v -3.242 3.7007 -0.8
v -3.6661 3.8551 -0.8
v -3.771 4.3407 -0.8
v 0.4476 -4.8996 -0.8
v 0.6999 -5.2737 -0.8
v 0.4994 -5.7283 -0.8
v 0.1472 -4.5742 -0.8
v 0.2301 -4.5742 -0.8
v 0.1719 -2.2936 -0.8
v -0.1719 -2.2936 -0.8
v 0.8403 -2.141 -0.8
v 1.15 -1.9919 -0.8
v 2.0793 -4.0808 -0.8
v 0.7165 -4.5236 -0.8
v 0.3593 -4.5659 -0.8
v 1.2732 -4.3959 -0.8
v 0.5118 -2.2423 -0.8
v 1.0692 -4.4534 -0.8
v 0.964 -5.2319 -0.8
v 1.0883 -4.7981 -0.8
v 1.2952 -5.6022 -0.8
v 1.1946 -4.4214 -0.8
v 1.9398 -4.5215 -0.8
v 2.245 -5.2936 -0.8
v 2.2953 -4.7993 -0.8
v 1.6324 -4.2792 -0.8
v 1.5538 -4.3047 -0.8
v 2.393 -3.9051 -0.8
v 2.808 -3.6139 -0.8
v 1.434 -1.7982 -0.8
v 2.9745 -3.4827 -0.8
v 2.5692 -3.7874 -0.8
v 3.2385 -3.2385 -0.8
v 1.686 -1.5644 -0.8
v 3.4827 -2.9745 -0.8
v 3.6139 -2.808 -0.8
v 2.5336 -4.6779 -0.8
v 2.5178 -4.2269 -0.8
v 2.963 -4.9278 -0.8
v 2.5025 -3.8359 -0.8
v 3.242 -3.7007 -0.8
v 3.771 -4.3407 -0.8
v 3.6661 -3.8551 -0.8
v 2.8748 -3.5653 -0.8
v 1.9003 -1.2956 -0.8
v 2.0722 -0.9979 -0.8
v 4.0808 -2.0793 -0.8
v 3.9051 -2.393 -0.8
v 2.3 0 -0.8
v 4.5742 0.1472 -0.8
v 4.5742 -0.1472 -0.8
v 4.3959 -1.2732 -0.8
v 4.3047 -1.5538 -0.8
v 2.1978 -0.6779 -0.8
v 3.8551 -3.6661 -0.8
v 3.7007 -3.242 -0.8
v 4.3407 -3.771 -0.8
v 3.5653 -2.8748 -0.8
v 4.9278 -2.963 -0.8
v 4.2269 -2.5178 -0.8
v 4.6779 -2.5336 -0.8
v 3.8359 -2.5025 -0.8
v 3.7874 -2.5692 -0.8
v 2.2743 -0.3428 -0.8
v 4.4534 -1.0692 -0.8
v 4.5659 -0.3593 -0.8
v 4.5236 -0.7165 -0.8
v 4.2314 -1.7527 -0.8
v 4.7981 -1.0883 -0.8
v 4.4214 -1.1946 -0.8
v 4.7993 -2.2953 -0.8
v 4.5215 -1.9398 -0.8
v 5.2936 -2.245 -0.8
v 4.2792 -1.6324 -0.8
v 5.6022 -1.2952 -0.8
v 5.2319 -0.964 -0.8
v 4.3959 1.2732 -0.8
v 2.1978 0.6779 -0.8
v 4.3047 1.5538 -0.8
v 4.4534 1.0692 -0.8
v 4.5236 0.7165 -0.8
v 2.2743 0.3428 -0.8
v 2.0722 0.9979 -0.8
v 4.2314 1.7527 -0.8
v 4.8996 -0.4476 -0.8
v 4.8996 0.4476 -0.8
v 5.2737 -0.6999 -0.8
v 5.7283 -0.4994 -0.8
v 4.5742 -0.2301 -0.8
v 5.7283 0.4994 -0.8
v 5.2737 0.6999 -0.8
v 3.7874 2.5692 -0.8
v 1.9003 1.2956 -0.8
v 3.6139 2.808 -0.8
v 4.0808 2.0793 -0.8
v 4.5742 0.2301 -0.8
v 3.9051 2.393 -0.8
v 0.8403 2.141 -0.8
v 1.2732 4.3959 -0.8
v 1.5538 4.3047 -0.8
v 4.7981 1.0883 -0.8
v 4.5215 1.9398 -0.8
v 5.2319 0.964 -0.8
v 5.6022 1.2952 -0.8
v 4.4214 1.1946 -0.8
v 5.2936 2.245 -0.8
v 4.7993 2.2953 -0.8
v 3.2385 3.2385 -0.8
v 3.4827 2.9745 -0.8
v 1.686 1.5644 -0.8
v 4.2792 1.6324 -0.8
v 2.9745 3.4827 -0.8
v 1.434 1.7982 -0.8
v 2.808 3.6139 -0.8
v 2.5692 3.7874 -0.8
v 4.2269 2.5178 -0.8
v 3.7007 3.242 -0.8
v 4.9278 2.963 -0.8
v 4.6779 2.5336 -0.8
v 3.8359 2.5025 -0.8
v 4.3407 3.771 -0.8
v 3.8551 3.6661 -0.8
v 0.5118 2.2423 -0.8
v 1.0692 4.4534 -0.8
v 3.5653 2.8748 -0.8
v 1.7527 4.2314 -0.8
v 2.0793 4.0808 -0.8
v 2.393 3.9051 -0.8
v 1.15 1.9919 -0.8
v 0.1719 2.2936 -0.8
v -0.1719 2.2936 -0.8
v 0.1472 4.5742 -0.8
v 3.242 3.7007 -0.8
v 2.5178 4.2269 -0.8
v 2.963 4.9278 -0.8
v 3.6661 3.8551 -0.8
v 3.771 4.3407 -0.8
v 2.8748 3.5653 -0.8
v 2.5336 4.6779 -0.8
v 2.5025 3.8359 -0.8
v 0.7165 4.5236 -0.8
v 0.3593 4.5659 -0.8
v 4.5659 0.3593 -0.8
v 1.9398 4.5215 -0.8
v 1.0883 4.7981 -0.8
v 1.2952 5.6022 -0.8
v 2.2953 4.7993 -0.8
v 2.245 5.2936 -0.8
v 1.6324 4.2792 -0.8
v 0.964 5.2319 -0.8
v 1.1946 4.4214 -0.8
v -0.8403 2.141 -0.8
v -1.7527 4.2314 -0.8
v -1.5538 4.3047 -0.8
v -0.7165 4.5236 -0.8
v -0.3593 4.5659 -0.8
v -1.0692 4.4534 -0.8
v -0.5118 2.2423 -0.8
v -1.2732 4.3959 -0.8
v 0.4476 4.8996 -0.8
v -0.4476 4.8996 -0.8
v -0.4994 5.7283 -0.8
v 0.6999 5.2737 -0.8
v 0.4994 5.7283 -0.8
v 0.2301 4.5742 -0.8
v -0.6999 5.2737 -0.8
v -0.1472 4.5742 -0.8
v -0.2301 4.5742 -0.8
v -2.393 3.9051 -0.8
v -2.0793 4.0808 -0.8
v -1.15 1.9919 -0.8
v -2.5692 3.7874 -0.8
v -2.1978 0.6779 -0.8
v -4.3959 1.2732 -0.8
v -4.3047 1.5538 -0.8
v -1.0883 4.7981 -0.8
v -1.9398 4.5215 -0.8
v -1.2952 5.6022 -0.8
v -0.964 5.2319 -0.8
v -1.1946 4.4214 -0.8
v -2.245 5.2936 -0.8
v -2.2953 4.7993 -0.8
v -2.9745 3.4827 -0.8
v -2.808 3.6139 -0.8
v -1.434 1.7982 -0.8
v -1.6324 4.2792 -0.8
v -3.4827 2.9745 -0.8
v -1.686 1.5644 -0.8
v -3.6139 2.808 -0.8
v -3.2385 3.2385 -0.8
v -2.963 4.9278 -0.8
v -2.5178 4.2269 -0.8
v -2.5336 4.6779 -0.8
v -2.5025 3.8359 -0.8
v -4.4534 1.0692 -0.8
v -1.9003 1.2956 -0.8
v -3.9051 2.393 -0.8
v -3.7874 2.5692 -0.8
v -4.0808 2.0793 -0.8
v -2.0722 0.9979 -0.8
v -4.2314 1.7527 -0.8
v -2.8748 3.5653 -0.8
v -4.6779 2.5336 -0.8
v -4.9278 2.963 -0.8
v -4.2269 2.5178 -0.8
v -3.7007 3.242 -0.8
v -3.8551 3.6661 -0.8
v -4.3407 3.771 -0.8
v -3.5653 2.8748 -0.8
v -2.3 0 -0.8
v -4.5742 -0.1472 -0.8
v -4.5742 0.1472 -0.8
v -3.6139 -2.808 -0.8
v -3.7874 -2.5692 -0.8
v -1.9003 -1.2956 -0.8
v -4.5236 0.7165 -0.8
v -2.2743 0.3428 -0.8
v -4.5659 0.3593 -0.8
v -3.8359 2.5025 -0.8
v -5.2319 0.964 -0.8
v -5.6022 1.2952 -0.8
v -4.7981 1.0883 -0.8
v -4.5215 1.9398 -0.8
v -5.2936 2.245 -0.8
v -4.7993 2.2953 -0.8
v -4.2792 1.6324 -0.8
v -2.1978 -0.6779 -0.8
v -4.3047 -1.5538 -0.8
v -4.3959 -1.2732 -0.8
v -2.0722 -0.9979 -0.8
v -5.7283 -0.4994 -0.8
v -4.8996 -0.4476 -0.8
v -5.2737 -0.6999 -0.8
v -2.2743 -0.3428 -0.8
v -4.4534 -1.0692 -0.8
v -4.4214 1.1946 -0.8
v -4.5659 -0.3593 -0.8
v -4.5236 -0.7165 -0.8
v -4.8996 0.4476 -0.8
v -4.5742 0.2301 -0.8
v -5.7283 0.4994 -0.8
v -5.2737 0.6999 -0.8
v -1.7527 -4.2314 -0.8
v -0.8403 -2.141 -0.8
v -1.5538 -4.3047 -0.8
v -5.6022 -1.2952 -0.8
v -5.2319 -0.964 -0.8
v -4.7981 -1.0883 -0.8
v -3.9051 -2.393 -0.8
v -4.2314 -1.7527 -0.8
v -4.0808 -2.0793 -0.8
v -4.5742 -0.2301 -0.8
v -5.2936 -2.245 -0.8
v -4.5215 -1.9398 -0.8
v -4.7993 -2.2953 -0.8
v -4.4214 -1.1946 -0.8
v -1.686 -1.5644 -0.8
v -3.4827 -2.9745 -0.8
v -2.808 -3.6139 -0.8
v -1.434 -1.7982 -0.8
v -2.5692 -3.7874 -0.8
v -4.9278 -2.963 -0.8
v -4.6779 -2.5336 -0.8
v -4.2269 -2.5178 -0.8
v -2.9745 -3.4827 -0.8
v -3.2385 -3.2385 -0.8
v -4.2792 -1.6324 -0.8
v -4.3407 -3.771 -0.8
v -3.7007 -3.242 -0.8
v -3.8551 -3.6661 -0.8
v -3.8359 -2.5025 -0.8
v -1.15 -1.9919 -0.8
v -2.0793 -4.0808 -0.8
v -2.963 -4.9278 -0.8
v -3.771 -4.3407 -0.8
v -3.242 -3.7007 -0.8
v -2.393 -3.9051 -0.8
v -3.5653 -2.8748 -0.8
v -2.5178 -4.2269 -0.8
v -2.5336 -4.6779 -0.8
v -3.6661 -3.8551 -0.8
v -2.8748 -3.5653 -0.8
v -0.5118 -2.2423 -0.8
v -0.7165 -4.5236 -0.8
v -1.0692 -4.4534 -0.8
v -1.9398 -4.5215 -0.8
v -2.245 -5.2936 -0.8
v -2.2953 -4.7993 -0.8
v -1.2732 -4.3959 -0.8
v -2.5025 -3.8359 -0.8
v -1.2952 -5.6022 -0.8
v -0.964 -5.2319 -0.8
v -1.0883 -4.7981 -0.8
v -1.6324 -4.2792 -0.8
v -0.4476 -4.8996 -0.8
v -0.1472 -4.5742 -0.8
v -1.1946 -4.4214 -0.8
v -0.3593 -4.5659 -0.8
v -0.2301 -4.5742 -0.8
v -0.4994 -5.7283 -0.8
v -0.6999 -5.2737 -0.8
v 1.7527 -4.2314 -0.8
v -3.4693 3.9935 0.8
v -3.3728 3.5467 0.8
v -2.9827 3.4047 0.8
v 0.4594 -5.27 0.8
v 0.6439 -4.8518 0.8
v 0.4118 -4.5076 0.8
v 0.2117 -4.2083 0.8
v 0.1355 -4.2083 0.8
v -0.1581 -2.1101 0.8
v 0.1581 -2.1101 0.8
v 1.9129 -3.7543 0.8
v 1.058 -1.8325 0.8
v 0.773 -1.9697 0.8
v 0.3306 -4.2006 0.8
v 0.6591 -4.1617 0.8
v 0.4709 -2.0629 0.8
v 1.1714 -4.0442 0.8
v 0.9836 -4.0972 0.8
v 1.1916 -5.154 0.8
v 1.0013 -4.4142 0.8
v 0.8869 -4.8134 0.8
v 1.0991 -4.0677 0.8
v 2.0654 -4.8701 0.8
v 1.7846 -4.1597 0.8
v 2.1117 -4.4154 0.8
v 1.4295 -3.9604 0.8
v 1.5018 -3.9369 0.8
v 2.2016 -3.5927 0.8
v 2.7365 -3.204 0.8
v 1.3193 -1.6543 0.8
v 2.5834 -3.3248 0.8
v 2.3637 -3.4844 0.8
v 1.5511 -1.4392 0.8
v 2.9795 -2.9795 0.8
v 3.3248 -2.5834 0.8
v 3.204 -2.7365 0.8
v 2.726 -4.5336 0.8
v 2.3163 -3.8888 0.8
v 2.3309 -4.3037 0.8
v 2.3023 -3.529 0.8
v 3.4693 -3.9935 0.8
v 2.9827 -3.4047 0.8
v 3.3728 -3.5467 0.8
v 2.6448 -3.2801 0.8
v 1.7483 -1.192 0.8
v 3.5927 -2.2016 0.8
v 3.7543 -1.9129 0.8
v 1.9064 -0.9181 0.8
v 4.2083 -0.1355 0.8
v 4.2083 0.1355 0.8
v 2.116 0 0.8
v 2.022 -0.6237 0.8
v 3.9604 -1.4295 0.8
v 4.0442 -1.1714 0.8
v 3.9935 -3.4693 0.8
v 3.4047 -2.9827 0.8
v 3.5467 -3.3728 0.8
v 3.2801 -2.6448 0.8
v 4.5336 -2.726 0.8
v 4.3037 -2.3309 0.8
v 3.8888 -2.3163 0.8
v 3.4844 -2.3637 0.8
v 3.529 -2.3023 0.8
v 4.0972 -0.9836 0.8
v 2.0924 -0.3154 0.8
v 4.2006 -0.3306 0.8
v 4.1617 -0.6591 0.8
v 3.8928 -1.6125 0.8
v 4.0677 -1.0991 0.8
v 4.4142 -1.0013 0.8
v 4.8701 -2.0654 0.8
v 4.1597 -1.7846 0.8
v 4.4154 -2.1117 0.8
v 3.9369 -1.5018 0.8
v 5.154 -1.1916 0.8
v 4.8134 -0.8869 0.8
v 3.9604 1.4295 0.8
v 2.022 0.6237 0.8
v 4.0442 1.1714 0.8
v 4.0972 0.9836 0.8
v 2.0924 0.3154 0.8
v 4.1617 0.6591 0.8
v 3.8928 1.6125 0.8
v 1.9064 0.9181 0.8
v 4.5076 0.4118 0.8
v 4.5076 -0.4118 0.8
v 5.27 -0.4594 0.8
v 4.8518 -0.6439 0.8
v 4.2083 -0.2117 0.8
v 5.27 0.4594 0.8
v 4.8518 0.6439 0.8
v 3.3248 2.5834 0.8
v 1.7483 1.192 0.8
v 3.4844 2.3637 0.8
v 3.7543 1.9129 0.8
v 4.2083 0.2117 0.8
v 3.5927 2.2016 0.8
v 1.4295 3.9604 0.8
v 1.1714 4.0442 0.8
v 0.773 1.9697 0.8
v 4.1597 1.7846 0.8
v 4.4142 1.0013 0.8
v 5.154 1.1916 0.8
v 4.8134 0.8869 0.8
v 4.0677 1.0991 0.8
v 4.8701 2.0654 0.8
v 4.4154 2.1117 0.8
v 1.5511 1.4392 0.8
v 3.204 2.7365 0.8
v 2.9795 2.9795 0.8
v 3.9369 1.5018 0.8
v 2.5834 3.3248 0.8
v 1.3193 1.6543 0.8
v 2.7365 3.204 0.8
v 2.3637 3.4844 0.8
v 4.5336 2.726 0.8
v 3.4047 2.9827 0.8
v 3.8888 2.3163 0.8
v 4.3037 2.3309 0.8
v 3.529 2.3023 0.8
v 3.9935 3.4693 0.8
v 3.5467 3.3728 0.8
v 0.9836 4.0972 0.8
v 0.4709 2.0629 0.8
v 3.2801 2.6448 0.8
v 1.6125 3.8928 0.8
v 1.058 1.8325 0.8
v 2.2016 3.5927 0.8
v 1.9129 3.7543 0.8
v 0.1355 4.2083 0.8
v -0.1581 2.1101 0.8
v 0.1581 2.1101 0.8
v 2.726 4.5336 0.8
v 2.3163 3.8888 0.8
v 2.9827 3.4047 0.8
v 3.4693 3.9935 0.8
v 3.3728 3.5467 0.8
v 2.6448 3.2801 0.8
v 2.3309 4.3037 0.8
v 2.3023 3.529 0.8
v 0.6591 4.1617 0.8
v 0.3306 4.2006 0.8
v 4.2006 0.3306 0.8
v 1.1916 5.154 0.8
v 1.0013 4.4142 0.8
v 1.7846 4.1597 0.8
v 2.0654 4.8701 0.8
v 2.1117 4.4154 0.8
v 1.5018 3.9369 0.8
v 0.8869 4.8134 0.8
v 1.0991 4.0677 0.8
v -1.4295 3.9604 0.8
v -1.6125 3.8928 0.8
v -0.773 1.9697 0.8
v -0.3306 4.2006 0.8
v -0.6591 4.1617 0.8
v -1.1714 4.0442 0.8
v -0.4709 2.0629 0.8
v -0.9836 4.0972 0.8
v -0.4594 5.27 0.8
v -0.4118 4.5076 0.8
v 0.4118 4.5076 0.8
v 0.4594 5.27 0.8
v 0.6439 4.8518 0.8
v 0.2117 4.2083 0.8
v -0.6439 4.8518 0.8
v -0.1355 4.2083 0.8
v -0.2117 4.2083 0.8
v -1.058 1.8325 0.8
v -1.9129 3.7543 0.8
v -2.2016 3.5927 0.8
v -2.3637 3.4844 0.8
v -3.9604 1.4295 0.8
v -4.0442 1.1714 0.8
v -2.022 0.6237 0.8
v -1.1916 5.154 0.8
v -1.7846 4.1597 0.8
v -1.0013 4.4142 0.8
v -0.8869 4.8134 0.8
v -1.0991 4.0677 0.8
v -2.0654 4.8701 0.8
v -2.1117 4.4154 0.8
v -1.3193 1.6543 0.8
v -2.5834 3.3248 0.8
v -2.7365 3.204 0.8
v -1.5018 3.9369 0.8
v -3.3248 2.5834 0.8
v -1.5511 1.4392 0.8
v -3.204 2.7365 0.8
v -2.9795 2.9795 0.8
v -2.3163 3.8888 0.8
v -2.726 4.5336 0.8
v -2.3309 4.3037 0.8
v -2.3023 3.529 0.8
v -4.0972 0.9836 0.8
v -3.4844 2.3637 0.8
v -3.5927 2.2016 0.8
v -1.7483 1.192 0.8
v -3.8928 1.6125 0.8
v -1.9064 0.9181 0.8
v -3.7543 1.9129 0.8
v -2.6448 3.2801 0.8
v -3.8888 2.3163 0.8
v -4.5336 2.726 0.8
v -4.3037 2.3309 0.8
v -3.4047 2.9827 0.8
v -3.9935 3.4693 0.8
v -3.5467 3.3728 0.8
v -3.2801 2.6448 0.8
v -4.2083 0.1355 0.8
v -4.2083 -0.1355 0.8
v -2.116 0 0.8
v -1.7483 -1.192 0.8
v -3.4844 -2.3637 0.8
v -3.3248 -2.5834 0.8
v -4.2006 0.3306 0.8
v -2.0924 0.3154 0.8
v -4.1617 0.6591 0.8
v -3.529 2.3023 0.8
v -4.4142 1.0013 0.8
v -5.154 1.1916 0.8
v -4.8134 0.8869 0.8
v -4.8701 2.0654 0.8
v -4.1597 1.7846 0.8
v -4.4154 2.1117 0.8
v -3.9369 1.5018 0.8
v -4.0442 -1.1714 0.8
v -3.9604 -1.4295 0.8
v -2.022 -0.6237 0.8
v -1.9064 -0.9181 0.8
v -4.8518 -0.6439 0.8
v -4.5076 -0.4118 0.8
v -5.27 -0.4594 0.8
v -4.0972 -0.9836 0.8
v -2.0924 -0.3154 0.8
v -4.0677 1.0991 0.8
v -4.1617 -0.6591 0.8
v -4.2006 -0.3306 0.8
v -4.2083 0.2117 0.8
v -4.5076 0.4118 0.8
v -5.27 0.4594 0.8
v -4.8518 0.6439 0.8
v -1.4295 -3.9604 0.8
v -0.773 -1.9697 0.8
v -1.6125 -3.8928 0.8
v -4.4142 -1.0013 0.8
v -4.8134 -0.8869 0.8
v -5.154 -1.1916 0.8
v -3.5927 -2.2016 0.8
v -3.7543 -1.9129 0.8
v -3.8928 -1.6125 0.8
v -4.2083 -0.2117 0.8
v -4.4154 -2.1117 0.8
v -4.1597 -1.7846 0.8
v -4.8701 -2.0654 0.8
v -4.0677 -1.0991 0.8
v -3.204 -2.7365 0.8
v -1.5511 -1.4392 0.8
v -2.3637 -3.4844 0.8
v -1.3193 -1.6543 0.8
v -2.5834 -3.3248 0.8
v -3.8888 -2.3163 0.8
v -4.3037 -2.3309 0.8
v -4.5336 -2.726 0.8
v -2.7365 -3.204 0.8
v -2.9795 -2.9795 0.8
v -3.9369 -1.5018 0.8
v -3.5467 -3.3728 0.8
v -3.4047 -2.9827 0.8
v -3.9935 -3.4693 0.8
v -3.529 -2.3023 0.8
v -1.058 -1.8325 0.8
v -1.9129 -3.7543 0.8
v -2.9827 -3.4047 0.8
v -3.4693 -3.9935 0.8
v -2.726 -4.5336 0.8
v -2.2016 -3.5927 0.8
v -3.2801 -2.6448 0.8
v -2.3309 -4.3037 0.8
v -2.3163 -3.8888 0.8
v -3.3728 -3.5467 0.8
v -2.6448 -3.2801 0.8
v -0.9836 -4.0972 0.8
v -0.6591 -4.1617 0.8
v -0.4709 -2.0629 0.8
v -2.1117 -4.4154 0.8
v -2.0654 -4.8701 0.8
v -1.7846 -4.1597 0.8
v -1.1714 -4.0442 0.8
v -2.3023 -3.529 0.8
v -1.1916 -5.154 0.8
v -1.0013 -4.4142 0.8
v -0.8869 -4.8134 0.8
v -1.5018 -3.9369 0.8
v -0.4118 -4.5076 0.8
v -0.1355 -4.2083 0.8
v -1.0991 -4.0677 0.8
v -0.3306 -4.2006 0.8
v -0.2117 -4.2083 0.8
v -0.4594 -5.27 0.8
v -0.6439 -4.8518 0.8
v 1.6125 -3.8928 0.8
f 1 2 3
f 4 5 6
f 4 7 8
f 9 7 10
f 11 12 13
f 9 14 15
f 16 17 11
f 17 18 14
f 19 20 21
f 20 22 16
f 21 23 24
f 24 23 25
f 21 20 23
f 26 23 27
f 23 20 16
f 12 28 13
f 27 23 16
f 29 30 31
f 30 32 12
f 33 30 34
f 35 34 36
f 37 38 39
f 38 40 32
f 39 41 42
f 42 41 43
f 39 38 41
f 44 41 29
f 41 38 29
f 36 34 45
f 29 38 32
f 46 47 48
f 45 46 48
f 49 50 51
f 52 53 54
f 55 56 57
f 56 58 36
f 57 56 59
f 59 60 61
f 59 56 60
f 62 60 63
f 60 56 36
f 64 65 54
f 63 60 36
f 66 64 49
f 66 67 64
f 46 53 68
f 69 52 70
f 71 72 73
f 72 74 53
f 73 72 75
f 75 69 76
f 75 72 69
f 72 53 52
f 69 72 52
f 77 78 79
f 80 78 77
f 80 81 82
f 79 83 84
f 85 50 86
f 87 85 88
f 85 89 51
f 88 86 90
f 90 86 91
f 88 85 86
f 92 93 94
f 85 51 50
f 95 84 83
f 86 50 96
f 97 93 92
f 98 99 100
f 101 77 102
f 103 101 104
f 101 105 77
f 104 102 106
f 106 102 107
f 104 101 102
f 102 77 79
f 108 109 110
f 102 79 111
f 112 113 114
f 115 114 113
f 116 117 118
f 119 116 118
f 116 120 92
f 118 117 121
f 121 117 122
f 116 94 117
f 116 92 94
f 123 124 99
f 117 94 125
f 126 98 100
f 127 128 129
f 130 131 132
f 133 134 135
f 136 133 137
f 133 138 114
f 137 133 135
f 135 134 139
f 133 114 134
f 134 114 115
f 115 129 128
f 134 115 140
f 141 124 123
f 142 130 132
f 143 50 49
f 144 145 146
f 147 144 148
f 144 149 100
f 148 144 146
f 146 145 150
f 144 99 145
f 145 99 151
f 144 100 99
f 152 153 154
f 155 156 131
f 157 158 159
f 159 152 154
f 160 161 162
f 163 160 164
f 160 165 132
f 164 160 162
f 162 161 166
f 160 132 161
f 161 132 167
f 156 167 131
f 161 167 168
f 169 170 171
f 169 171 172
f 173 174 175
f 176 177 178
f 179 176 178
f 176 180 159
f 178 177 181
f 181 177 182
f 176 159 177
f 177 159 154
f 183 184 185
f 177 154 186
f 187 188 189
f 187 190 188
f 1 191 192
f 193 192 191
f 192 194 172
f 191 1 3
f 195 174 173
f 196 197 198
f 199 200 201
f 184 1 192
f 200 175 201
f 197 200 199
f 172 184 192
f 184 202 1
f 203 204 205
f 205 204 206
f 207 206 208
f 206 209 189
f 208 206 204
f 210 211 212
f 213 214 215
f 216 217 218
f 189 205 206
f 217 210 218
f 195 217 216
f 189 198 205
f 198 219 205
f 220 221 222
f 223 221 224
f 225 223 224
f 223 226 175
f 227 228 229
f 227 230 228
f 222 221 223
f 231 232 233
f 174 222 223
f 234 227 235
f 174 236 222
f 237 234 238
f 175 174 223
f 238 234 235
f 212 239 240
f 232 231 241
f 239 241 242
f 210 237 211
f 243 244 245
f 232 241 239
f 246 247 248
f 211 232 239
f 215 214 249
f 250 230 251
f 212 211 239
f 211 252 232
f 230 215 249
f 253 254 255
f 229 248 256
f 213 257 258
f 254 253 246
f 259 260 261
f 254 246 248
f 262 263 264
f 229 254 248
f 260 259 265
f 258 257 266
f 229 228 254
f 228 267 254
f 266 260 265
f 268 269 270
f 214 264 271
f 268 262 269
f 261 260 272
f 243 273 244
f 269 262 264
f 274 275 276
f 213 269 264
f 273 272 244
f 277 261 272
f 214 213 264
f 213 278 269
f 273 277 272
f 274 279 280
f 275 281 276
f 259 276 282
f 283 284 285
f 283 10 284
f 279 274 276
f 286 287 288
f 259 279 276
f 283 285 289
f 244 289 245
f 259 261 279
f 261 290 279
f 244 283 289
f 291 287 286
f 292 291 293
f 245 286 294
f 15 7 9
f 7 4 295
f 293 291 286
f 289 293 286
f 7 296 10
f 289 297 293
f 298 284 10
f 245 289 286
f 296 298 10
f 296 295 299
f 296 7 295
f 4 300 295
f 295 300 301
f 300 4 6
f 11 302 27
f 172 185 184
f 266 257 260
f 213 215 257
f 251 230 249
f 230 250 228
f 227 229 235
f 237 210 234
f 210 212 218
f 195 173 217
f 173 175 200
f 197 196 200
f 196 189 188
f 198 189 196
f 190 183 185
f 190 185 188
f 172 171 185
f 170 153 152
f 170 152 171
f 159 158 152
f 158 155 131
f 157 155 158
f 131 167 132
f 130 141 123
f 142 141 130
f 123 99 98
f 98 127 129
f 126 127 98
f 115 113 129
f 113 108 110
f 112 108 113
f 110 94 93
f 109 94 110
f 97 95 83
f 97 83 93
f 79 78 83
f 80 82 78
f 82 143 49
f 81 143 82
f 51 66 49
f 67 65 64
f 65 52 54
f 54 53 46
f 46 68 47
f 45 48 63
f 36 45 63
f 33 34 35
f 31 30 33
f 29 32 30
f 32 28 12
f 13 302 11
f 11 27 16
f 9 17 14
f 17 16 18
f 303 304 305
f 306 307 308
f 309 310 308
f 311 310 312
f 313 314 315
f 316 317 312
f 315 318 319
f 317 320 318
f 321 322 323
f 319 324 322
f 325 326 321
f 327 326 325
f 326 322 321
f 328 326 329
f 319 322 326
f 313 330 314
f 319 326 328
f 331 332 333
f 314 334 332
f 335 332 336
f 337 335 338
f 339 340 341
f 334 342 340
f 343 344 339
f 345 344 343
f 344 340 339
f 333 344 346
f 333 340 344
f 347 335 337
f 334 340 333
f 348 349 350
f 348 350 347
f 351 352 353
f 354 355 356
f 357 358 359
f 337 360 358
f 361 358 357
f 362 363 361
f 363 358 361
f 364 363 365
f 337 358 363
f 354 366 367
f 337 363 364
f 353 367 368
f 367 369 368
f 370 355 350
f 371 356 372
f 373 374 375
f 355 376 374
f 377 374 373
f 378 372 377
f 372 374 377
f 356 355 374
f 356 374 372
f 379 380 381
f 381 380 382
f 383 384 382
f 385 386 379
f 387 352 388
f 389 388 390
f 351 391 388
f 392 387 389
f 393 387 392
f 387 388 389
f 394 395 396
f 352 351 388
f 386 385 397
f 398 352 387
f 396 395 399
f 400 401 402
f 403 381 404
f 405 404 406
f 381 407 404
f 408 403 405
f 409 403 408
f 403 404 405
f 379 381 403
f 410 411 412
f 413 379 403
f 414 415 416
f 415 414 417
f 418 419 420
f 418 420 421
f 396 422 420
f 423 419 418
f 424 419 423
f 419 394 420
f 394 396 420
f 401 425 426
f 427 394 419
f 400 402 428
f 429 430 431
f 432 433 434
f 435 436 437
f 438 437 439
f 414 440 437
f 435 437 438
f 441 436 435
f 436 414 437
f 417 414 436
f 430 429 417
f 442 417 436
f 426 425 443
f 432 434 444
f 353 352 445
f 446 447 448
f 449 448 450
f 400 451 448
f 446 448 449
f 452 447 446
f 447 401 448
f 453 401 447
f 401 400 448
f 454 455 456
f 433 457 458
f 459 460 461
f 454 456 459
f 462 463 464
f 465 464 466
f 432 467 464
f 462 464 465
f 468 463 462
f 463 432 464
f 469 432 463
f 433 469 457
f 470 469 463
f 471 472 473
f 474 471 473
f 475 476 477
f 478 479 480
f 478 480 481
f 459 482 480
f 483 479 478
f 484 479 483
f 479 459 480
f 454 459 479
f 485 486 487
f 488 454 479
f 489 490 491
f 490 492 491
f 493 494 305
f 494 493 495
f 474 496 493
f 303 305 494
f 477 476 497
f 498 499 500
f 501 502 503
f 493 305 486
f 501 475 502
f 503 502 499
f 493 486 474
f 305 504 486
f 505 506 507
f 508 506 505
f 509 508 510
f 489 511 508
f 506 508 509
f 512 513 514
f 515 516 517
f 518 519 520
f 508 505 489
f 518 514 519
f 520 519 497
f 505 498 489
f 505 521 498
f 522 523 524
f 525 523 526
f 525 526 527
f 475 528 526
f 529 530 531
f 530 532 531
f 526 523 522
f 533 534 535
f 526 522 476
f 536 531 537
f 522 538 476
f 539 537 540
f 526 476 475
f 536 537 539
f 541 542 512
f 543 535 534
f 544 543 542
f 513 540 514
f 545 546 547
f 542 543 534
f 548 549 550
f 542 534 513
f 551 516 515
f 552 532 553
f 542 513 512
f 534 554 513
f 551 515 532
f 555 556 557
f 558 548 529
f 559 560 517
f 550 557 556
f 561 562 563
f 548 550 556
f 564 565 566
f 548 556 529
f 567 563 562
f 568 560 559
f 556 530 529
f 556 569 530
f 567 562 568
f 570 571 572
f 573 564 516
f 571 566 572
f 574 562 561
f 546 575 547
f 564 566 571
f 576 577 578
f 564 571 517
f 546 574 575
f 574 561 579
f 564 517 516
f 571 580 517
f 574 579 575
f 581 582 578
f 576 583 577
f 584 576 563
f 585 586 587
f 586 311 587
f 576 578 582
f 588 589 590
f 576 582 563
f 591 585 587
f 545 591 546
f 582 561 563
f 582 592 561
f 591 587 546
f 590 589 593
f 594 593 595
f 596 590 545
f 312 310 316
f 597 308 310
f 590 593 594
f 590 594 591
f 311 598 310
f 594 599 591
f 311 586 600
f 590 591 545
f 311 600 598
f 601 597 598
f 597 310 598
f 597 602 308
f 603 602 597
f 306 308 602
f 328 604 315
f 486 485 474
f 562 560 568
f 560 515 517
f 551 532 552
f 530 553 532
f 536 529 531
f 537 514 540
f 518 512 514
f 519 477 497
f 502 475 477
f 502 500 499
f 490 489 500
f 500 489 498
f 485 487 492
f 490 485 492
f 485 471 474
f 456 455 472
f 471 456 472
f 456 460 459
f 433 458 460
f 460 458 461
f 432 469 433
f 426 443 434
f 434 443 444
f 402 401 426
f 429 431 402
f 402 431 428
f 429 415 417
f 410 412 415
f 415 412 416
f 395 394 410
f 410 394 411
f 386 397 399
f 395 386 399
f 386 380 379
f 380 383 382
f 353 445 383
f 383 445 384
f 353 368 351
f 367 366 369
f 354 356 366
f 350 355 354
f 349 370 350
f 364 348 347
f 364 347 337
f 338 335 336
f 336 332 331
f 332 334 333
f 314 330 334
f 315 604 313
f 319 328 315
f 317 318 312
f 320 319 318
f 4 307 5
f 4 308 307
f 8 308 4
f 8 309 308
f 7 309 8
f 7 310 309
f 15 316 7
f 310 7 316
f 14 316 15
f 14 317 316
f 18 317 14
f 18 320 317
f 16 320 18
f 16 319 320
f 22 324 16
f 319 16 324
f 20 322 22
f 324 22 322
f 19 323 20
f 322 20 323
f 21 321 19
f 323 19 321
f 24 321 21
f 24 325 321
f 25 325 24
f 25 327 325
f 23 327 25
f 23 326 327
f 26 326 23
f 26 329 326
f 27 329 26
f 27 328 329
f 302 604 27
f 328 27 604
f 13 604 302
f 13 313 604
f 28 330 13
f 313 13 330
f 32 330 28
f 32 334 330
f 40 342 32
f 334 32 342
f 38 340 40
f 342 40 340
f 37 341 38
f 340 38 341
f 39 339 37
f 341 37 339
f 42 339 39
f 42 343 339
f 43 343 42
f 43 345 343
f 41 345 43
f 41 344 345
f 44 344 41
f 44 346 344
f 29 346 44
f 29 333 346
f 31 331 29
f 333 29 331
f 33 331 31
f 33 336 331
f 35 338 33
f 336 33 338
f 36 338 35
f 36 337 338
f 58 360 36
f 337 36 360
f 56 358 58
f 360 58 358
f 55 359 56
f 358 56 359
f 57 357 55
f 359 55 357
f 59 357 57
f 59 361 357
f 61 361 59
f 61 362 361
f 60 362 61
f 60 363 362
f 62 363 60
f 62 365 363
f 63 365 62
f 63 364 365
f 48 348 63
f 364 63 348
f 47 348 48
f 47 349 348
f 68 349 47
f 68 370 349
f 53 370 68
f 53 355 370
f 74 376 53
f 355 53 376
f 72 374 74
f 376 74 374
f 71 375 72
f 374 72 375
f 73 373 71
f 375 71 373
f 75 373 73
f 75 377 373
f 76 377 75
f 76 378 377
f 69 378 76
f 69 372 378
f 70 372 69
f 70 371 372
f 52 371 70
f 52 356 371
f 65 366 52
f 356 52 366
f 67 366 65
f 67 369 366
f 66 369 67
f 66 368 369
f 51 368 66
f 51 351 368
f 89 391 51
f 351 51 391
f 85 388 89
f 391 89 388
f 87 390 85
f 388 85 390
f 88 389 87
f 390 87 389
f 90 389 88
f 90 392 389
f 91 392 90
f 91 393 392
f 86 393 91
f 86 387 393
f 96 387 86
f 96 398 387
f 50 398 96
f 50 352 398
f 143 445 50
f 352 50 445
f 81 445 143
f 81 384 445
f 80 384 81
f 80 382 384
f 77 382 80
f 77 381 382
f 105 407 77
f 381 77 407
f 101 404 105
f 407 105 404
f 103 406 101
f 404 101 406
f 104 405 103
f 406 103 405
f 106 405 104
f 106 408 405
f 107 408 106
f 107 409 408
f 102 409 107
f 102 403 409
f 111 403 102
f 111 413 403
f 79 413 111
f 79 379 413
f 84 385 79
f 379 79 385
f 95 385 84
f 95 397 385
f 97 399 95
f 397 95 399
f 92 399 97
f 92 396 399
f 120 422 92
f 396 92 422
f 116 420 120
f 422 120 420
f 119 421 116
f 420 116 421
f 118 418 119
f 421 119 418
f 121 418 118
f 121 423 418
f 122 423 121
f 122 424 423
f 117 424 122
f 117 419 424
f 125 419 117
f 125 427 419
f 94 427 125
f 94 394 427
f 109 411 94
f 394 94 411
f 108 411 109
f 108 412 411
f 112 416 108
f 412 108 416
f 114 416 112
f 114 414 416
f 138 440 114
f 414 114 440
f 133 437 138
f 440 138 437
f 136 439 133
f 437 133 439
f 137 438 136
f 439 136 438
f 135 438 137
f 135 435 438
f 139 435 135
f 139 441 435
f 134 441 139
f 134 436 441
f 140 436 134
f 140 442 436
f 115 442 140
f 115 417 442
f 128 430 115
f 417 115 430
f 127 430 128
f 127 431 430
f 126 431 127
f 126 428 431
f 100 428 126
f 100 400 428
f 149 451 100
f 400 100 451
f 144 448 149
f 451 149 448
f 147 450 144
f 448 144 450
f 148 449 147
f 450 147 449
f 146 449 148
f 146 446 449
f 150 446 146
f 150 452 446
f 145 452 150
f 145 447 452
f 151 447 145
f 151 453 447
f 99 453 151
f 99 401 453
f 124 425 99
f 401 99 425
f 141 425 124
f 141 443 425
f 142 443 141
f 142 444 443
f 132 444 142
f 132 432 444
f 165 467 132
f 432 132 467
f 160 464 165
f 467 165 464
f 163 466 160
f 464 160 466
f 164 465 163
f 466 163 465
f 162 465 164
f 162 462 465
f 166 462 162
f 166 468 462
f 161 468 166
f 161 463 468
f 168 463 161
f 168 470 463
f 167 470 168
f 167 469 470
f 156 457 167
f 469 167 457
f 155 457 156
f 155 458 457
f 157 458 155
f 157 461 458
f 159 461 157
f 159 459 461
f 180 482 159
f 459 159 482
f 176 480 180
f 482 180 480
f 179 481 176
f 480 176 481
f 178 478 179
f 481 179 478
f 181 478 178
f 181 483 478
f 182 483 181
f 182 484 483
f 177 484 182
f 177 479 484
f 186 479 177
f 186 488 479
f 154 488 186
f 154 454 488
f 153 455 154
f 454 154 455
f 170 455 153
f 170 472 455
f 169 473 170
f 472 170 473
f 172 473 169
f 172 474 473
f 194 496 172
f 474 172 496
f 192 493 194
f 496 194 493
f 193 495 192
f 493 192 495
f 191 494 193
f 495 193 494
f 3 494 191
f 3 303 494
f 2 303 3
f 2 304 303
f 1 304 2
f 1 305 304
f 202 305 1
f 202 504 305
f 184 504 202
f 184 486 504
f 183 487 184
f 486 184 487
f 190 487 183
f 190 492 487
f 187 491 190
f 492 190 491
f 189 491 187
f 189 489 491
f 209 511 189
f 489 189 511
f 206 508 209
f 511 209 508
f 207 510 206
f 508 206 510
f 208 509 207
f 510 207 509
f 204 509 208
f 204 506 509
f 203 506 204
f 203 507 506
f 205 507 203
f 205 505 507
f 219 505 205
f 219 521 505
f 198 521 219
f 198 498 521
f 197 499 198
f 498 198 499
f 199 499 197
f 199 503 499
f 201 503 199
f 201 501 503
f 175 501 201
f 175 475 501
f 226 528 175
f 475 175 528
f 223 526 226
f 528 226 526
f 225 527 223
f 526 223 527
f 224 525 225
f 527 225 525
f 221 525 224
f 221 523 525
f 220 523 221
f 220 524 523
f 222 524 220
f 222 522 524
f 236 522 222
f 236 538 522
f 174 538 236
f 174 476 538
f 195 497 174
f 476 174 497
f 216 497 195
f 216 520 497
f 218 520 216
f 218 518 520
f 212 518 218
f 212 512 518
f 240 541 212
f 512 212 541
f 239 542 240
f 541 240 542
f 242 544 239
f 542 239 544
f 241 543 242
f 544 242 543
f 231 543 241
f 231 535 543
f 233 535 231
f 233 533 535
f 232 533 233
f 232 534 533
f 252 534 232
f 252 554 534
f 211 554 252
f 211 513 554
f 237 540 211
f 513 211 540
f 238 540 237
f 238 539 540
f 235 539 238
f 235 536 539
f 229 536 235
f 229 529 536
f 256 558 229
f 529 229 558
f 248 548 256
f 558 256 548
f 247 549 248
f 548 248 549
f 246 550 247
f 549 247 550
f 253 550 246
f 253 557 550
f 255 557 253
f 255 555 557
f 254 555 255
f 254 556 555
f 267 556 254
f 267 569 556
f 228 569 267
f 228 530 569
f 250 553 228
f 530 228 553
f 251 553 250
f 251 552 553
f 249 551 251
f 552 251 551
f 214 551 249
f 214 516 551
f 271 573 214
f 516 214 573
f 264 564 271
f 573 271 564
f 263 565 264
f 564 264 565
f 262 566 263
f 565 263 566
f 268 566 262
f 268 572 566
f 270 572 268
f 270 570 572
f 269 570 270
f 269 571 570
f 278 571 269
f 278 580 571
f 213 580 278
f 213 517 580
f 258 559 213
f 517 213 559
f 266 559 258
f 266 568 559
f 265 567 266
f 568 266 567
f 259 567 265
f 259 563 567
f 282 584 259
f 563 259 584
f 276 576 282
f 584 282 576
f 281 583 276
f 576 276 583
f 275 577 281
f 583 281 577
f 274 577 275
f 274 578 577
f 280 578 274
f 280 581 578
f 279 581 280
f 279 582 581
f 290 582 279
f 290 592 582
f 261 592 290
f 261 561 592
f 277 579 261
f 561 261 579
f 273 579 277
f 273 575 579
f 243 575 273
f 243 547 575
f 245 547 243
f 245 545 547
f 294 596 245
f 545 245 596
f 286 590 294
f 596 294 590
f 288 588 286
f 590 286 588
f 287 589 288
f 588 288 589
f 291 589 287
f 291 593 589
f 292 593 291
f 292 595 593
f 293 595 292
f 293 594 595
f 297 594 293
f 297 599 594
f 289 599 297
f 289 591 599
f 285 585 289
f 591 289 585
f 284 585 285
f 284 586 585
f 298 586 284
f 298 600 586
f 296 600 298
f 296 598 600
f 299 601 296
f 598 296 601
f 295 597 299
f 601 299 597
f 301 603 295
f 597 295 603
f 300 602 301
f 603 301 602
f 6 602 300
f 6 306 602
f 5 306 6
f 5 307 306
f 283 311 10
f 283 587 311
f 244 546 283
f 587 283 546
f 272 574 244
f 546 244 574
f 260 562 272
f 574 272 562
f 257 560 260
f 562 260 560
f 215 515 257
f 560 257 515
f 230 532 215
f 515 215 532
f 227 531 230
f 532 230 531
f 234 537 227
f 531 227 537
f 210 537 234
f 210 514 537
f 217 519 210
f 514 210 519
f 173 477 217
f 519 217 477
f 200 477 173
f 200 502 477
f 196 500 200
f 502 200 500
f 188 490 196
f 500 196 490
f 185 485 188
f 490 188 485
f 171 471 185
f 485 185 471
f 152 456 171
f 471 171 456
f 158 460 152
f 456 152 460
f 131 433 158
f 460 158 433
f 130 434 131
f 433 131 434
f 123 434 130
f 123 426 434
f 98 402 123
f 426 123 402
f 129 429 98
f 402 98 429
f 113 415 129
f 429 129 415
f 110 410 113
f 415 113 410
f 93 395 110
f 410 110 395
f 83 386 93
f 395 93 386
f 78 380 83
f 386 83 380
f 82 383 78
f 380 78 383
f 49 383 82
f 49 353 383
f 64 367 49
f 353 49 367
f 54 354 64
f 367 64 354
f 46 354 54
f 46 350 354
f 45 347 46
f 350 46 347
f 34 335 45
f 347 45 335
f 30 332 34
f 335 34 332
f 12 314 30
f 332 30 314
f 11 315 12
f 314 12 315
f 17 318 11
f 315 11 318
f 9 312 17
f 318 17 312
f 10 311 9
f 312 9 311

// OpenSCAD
// part_id: b0
// name: B0 small gear
// source_drawing_ids: DRW-002
// units: mm
// revision: 0.2
// SPDX-License-Identifier: MIT

function b0_polar(r, a_deg) = [r * cos(a_deg), r * sin(a_deg)];

module b0_tooth_2d(
    outer_r = 5.75,
    shoulder_r = 5.32,
    neck_r = 4.92,
    root_r = 4.58,
    pitch_deg = 18,
    tooth_tip_w = 1.0,
    shoulder_ratio = 1.85,
    neck_ratio = 1.25
) {
    tip_half_deg = (tooth_tip_w / outer_r) * 180 / PI / 2;
    shoulder_half_deg = min(pitch_deg * 0.42, tip_half_deg * shoulder_ratio);
    neck_half_deg = min(pitch_deg * 0.29, tip_half_deg * neck_ratio);
    root_half_deg = pitch_deg * 0.16;

    polygon(points = [
        b0_polar(root_r, -root_half_deg),
        b0_polar(neck_r, -neck_half_deg),
        b0_polar(shoulder_r, -shoulder_half_deg),
        b0_polar(outer_r, -tip_half_deg),
        b0_polar(outer_r, tip_half_deg),
        b0_polar(shoulder_r, shoulder_half_deg),
        b0_polar(neck_r, neck_half_deg),
        b0_polar(root_r, root_half_deg)
    ]);
}

module b0_gear_2d(
    outer_d = 11.5,
    root_d = 9.16,
    shoulder_d = 10.64,
    neck_d = 9.84,
    tooth_count = 20,
    bore_d = 4.6,
    tooth_tip_w = 1.0
) {
    pitch_deg = 360 / tooth_count;

    difference() {
        union() {
            circle(d = root_d, $fn = 80);
            for (i = [0 : tooth_count - 1])
                rotate(i * 360 / tooth_count)
                    b0_tooth_2d(
                        outer_r = outer_d / 2,
                        shoulder_r = shoulder_d / 2,
                        neck_r = neck_d / 2,
                        root_r = root_d / 2,
                        pitch_deg = pitch_deg,
                        tooth_tip_w = tooth_tip_w
                    );
        }
        circle(d = bore_d, $fn = 42);
    }
}

module part_b0(thickness = 1.6, taper = 0.92) {
    // Slight taper improves the isometric read against the source drawing,
    // while the sheet-cut profile remains defined by b0_gear_2d().
    translate([0, 0, -thickness / 2])
        linear_extrude(height = thickness, scale = taper)
            b0_gear_2d();
}

// ---- "main guard" ----
// Default to previewing when opened directly:
if (is_undef(__LIB_MODE__)) {
    part_b0();
}
